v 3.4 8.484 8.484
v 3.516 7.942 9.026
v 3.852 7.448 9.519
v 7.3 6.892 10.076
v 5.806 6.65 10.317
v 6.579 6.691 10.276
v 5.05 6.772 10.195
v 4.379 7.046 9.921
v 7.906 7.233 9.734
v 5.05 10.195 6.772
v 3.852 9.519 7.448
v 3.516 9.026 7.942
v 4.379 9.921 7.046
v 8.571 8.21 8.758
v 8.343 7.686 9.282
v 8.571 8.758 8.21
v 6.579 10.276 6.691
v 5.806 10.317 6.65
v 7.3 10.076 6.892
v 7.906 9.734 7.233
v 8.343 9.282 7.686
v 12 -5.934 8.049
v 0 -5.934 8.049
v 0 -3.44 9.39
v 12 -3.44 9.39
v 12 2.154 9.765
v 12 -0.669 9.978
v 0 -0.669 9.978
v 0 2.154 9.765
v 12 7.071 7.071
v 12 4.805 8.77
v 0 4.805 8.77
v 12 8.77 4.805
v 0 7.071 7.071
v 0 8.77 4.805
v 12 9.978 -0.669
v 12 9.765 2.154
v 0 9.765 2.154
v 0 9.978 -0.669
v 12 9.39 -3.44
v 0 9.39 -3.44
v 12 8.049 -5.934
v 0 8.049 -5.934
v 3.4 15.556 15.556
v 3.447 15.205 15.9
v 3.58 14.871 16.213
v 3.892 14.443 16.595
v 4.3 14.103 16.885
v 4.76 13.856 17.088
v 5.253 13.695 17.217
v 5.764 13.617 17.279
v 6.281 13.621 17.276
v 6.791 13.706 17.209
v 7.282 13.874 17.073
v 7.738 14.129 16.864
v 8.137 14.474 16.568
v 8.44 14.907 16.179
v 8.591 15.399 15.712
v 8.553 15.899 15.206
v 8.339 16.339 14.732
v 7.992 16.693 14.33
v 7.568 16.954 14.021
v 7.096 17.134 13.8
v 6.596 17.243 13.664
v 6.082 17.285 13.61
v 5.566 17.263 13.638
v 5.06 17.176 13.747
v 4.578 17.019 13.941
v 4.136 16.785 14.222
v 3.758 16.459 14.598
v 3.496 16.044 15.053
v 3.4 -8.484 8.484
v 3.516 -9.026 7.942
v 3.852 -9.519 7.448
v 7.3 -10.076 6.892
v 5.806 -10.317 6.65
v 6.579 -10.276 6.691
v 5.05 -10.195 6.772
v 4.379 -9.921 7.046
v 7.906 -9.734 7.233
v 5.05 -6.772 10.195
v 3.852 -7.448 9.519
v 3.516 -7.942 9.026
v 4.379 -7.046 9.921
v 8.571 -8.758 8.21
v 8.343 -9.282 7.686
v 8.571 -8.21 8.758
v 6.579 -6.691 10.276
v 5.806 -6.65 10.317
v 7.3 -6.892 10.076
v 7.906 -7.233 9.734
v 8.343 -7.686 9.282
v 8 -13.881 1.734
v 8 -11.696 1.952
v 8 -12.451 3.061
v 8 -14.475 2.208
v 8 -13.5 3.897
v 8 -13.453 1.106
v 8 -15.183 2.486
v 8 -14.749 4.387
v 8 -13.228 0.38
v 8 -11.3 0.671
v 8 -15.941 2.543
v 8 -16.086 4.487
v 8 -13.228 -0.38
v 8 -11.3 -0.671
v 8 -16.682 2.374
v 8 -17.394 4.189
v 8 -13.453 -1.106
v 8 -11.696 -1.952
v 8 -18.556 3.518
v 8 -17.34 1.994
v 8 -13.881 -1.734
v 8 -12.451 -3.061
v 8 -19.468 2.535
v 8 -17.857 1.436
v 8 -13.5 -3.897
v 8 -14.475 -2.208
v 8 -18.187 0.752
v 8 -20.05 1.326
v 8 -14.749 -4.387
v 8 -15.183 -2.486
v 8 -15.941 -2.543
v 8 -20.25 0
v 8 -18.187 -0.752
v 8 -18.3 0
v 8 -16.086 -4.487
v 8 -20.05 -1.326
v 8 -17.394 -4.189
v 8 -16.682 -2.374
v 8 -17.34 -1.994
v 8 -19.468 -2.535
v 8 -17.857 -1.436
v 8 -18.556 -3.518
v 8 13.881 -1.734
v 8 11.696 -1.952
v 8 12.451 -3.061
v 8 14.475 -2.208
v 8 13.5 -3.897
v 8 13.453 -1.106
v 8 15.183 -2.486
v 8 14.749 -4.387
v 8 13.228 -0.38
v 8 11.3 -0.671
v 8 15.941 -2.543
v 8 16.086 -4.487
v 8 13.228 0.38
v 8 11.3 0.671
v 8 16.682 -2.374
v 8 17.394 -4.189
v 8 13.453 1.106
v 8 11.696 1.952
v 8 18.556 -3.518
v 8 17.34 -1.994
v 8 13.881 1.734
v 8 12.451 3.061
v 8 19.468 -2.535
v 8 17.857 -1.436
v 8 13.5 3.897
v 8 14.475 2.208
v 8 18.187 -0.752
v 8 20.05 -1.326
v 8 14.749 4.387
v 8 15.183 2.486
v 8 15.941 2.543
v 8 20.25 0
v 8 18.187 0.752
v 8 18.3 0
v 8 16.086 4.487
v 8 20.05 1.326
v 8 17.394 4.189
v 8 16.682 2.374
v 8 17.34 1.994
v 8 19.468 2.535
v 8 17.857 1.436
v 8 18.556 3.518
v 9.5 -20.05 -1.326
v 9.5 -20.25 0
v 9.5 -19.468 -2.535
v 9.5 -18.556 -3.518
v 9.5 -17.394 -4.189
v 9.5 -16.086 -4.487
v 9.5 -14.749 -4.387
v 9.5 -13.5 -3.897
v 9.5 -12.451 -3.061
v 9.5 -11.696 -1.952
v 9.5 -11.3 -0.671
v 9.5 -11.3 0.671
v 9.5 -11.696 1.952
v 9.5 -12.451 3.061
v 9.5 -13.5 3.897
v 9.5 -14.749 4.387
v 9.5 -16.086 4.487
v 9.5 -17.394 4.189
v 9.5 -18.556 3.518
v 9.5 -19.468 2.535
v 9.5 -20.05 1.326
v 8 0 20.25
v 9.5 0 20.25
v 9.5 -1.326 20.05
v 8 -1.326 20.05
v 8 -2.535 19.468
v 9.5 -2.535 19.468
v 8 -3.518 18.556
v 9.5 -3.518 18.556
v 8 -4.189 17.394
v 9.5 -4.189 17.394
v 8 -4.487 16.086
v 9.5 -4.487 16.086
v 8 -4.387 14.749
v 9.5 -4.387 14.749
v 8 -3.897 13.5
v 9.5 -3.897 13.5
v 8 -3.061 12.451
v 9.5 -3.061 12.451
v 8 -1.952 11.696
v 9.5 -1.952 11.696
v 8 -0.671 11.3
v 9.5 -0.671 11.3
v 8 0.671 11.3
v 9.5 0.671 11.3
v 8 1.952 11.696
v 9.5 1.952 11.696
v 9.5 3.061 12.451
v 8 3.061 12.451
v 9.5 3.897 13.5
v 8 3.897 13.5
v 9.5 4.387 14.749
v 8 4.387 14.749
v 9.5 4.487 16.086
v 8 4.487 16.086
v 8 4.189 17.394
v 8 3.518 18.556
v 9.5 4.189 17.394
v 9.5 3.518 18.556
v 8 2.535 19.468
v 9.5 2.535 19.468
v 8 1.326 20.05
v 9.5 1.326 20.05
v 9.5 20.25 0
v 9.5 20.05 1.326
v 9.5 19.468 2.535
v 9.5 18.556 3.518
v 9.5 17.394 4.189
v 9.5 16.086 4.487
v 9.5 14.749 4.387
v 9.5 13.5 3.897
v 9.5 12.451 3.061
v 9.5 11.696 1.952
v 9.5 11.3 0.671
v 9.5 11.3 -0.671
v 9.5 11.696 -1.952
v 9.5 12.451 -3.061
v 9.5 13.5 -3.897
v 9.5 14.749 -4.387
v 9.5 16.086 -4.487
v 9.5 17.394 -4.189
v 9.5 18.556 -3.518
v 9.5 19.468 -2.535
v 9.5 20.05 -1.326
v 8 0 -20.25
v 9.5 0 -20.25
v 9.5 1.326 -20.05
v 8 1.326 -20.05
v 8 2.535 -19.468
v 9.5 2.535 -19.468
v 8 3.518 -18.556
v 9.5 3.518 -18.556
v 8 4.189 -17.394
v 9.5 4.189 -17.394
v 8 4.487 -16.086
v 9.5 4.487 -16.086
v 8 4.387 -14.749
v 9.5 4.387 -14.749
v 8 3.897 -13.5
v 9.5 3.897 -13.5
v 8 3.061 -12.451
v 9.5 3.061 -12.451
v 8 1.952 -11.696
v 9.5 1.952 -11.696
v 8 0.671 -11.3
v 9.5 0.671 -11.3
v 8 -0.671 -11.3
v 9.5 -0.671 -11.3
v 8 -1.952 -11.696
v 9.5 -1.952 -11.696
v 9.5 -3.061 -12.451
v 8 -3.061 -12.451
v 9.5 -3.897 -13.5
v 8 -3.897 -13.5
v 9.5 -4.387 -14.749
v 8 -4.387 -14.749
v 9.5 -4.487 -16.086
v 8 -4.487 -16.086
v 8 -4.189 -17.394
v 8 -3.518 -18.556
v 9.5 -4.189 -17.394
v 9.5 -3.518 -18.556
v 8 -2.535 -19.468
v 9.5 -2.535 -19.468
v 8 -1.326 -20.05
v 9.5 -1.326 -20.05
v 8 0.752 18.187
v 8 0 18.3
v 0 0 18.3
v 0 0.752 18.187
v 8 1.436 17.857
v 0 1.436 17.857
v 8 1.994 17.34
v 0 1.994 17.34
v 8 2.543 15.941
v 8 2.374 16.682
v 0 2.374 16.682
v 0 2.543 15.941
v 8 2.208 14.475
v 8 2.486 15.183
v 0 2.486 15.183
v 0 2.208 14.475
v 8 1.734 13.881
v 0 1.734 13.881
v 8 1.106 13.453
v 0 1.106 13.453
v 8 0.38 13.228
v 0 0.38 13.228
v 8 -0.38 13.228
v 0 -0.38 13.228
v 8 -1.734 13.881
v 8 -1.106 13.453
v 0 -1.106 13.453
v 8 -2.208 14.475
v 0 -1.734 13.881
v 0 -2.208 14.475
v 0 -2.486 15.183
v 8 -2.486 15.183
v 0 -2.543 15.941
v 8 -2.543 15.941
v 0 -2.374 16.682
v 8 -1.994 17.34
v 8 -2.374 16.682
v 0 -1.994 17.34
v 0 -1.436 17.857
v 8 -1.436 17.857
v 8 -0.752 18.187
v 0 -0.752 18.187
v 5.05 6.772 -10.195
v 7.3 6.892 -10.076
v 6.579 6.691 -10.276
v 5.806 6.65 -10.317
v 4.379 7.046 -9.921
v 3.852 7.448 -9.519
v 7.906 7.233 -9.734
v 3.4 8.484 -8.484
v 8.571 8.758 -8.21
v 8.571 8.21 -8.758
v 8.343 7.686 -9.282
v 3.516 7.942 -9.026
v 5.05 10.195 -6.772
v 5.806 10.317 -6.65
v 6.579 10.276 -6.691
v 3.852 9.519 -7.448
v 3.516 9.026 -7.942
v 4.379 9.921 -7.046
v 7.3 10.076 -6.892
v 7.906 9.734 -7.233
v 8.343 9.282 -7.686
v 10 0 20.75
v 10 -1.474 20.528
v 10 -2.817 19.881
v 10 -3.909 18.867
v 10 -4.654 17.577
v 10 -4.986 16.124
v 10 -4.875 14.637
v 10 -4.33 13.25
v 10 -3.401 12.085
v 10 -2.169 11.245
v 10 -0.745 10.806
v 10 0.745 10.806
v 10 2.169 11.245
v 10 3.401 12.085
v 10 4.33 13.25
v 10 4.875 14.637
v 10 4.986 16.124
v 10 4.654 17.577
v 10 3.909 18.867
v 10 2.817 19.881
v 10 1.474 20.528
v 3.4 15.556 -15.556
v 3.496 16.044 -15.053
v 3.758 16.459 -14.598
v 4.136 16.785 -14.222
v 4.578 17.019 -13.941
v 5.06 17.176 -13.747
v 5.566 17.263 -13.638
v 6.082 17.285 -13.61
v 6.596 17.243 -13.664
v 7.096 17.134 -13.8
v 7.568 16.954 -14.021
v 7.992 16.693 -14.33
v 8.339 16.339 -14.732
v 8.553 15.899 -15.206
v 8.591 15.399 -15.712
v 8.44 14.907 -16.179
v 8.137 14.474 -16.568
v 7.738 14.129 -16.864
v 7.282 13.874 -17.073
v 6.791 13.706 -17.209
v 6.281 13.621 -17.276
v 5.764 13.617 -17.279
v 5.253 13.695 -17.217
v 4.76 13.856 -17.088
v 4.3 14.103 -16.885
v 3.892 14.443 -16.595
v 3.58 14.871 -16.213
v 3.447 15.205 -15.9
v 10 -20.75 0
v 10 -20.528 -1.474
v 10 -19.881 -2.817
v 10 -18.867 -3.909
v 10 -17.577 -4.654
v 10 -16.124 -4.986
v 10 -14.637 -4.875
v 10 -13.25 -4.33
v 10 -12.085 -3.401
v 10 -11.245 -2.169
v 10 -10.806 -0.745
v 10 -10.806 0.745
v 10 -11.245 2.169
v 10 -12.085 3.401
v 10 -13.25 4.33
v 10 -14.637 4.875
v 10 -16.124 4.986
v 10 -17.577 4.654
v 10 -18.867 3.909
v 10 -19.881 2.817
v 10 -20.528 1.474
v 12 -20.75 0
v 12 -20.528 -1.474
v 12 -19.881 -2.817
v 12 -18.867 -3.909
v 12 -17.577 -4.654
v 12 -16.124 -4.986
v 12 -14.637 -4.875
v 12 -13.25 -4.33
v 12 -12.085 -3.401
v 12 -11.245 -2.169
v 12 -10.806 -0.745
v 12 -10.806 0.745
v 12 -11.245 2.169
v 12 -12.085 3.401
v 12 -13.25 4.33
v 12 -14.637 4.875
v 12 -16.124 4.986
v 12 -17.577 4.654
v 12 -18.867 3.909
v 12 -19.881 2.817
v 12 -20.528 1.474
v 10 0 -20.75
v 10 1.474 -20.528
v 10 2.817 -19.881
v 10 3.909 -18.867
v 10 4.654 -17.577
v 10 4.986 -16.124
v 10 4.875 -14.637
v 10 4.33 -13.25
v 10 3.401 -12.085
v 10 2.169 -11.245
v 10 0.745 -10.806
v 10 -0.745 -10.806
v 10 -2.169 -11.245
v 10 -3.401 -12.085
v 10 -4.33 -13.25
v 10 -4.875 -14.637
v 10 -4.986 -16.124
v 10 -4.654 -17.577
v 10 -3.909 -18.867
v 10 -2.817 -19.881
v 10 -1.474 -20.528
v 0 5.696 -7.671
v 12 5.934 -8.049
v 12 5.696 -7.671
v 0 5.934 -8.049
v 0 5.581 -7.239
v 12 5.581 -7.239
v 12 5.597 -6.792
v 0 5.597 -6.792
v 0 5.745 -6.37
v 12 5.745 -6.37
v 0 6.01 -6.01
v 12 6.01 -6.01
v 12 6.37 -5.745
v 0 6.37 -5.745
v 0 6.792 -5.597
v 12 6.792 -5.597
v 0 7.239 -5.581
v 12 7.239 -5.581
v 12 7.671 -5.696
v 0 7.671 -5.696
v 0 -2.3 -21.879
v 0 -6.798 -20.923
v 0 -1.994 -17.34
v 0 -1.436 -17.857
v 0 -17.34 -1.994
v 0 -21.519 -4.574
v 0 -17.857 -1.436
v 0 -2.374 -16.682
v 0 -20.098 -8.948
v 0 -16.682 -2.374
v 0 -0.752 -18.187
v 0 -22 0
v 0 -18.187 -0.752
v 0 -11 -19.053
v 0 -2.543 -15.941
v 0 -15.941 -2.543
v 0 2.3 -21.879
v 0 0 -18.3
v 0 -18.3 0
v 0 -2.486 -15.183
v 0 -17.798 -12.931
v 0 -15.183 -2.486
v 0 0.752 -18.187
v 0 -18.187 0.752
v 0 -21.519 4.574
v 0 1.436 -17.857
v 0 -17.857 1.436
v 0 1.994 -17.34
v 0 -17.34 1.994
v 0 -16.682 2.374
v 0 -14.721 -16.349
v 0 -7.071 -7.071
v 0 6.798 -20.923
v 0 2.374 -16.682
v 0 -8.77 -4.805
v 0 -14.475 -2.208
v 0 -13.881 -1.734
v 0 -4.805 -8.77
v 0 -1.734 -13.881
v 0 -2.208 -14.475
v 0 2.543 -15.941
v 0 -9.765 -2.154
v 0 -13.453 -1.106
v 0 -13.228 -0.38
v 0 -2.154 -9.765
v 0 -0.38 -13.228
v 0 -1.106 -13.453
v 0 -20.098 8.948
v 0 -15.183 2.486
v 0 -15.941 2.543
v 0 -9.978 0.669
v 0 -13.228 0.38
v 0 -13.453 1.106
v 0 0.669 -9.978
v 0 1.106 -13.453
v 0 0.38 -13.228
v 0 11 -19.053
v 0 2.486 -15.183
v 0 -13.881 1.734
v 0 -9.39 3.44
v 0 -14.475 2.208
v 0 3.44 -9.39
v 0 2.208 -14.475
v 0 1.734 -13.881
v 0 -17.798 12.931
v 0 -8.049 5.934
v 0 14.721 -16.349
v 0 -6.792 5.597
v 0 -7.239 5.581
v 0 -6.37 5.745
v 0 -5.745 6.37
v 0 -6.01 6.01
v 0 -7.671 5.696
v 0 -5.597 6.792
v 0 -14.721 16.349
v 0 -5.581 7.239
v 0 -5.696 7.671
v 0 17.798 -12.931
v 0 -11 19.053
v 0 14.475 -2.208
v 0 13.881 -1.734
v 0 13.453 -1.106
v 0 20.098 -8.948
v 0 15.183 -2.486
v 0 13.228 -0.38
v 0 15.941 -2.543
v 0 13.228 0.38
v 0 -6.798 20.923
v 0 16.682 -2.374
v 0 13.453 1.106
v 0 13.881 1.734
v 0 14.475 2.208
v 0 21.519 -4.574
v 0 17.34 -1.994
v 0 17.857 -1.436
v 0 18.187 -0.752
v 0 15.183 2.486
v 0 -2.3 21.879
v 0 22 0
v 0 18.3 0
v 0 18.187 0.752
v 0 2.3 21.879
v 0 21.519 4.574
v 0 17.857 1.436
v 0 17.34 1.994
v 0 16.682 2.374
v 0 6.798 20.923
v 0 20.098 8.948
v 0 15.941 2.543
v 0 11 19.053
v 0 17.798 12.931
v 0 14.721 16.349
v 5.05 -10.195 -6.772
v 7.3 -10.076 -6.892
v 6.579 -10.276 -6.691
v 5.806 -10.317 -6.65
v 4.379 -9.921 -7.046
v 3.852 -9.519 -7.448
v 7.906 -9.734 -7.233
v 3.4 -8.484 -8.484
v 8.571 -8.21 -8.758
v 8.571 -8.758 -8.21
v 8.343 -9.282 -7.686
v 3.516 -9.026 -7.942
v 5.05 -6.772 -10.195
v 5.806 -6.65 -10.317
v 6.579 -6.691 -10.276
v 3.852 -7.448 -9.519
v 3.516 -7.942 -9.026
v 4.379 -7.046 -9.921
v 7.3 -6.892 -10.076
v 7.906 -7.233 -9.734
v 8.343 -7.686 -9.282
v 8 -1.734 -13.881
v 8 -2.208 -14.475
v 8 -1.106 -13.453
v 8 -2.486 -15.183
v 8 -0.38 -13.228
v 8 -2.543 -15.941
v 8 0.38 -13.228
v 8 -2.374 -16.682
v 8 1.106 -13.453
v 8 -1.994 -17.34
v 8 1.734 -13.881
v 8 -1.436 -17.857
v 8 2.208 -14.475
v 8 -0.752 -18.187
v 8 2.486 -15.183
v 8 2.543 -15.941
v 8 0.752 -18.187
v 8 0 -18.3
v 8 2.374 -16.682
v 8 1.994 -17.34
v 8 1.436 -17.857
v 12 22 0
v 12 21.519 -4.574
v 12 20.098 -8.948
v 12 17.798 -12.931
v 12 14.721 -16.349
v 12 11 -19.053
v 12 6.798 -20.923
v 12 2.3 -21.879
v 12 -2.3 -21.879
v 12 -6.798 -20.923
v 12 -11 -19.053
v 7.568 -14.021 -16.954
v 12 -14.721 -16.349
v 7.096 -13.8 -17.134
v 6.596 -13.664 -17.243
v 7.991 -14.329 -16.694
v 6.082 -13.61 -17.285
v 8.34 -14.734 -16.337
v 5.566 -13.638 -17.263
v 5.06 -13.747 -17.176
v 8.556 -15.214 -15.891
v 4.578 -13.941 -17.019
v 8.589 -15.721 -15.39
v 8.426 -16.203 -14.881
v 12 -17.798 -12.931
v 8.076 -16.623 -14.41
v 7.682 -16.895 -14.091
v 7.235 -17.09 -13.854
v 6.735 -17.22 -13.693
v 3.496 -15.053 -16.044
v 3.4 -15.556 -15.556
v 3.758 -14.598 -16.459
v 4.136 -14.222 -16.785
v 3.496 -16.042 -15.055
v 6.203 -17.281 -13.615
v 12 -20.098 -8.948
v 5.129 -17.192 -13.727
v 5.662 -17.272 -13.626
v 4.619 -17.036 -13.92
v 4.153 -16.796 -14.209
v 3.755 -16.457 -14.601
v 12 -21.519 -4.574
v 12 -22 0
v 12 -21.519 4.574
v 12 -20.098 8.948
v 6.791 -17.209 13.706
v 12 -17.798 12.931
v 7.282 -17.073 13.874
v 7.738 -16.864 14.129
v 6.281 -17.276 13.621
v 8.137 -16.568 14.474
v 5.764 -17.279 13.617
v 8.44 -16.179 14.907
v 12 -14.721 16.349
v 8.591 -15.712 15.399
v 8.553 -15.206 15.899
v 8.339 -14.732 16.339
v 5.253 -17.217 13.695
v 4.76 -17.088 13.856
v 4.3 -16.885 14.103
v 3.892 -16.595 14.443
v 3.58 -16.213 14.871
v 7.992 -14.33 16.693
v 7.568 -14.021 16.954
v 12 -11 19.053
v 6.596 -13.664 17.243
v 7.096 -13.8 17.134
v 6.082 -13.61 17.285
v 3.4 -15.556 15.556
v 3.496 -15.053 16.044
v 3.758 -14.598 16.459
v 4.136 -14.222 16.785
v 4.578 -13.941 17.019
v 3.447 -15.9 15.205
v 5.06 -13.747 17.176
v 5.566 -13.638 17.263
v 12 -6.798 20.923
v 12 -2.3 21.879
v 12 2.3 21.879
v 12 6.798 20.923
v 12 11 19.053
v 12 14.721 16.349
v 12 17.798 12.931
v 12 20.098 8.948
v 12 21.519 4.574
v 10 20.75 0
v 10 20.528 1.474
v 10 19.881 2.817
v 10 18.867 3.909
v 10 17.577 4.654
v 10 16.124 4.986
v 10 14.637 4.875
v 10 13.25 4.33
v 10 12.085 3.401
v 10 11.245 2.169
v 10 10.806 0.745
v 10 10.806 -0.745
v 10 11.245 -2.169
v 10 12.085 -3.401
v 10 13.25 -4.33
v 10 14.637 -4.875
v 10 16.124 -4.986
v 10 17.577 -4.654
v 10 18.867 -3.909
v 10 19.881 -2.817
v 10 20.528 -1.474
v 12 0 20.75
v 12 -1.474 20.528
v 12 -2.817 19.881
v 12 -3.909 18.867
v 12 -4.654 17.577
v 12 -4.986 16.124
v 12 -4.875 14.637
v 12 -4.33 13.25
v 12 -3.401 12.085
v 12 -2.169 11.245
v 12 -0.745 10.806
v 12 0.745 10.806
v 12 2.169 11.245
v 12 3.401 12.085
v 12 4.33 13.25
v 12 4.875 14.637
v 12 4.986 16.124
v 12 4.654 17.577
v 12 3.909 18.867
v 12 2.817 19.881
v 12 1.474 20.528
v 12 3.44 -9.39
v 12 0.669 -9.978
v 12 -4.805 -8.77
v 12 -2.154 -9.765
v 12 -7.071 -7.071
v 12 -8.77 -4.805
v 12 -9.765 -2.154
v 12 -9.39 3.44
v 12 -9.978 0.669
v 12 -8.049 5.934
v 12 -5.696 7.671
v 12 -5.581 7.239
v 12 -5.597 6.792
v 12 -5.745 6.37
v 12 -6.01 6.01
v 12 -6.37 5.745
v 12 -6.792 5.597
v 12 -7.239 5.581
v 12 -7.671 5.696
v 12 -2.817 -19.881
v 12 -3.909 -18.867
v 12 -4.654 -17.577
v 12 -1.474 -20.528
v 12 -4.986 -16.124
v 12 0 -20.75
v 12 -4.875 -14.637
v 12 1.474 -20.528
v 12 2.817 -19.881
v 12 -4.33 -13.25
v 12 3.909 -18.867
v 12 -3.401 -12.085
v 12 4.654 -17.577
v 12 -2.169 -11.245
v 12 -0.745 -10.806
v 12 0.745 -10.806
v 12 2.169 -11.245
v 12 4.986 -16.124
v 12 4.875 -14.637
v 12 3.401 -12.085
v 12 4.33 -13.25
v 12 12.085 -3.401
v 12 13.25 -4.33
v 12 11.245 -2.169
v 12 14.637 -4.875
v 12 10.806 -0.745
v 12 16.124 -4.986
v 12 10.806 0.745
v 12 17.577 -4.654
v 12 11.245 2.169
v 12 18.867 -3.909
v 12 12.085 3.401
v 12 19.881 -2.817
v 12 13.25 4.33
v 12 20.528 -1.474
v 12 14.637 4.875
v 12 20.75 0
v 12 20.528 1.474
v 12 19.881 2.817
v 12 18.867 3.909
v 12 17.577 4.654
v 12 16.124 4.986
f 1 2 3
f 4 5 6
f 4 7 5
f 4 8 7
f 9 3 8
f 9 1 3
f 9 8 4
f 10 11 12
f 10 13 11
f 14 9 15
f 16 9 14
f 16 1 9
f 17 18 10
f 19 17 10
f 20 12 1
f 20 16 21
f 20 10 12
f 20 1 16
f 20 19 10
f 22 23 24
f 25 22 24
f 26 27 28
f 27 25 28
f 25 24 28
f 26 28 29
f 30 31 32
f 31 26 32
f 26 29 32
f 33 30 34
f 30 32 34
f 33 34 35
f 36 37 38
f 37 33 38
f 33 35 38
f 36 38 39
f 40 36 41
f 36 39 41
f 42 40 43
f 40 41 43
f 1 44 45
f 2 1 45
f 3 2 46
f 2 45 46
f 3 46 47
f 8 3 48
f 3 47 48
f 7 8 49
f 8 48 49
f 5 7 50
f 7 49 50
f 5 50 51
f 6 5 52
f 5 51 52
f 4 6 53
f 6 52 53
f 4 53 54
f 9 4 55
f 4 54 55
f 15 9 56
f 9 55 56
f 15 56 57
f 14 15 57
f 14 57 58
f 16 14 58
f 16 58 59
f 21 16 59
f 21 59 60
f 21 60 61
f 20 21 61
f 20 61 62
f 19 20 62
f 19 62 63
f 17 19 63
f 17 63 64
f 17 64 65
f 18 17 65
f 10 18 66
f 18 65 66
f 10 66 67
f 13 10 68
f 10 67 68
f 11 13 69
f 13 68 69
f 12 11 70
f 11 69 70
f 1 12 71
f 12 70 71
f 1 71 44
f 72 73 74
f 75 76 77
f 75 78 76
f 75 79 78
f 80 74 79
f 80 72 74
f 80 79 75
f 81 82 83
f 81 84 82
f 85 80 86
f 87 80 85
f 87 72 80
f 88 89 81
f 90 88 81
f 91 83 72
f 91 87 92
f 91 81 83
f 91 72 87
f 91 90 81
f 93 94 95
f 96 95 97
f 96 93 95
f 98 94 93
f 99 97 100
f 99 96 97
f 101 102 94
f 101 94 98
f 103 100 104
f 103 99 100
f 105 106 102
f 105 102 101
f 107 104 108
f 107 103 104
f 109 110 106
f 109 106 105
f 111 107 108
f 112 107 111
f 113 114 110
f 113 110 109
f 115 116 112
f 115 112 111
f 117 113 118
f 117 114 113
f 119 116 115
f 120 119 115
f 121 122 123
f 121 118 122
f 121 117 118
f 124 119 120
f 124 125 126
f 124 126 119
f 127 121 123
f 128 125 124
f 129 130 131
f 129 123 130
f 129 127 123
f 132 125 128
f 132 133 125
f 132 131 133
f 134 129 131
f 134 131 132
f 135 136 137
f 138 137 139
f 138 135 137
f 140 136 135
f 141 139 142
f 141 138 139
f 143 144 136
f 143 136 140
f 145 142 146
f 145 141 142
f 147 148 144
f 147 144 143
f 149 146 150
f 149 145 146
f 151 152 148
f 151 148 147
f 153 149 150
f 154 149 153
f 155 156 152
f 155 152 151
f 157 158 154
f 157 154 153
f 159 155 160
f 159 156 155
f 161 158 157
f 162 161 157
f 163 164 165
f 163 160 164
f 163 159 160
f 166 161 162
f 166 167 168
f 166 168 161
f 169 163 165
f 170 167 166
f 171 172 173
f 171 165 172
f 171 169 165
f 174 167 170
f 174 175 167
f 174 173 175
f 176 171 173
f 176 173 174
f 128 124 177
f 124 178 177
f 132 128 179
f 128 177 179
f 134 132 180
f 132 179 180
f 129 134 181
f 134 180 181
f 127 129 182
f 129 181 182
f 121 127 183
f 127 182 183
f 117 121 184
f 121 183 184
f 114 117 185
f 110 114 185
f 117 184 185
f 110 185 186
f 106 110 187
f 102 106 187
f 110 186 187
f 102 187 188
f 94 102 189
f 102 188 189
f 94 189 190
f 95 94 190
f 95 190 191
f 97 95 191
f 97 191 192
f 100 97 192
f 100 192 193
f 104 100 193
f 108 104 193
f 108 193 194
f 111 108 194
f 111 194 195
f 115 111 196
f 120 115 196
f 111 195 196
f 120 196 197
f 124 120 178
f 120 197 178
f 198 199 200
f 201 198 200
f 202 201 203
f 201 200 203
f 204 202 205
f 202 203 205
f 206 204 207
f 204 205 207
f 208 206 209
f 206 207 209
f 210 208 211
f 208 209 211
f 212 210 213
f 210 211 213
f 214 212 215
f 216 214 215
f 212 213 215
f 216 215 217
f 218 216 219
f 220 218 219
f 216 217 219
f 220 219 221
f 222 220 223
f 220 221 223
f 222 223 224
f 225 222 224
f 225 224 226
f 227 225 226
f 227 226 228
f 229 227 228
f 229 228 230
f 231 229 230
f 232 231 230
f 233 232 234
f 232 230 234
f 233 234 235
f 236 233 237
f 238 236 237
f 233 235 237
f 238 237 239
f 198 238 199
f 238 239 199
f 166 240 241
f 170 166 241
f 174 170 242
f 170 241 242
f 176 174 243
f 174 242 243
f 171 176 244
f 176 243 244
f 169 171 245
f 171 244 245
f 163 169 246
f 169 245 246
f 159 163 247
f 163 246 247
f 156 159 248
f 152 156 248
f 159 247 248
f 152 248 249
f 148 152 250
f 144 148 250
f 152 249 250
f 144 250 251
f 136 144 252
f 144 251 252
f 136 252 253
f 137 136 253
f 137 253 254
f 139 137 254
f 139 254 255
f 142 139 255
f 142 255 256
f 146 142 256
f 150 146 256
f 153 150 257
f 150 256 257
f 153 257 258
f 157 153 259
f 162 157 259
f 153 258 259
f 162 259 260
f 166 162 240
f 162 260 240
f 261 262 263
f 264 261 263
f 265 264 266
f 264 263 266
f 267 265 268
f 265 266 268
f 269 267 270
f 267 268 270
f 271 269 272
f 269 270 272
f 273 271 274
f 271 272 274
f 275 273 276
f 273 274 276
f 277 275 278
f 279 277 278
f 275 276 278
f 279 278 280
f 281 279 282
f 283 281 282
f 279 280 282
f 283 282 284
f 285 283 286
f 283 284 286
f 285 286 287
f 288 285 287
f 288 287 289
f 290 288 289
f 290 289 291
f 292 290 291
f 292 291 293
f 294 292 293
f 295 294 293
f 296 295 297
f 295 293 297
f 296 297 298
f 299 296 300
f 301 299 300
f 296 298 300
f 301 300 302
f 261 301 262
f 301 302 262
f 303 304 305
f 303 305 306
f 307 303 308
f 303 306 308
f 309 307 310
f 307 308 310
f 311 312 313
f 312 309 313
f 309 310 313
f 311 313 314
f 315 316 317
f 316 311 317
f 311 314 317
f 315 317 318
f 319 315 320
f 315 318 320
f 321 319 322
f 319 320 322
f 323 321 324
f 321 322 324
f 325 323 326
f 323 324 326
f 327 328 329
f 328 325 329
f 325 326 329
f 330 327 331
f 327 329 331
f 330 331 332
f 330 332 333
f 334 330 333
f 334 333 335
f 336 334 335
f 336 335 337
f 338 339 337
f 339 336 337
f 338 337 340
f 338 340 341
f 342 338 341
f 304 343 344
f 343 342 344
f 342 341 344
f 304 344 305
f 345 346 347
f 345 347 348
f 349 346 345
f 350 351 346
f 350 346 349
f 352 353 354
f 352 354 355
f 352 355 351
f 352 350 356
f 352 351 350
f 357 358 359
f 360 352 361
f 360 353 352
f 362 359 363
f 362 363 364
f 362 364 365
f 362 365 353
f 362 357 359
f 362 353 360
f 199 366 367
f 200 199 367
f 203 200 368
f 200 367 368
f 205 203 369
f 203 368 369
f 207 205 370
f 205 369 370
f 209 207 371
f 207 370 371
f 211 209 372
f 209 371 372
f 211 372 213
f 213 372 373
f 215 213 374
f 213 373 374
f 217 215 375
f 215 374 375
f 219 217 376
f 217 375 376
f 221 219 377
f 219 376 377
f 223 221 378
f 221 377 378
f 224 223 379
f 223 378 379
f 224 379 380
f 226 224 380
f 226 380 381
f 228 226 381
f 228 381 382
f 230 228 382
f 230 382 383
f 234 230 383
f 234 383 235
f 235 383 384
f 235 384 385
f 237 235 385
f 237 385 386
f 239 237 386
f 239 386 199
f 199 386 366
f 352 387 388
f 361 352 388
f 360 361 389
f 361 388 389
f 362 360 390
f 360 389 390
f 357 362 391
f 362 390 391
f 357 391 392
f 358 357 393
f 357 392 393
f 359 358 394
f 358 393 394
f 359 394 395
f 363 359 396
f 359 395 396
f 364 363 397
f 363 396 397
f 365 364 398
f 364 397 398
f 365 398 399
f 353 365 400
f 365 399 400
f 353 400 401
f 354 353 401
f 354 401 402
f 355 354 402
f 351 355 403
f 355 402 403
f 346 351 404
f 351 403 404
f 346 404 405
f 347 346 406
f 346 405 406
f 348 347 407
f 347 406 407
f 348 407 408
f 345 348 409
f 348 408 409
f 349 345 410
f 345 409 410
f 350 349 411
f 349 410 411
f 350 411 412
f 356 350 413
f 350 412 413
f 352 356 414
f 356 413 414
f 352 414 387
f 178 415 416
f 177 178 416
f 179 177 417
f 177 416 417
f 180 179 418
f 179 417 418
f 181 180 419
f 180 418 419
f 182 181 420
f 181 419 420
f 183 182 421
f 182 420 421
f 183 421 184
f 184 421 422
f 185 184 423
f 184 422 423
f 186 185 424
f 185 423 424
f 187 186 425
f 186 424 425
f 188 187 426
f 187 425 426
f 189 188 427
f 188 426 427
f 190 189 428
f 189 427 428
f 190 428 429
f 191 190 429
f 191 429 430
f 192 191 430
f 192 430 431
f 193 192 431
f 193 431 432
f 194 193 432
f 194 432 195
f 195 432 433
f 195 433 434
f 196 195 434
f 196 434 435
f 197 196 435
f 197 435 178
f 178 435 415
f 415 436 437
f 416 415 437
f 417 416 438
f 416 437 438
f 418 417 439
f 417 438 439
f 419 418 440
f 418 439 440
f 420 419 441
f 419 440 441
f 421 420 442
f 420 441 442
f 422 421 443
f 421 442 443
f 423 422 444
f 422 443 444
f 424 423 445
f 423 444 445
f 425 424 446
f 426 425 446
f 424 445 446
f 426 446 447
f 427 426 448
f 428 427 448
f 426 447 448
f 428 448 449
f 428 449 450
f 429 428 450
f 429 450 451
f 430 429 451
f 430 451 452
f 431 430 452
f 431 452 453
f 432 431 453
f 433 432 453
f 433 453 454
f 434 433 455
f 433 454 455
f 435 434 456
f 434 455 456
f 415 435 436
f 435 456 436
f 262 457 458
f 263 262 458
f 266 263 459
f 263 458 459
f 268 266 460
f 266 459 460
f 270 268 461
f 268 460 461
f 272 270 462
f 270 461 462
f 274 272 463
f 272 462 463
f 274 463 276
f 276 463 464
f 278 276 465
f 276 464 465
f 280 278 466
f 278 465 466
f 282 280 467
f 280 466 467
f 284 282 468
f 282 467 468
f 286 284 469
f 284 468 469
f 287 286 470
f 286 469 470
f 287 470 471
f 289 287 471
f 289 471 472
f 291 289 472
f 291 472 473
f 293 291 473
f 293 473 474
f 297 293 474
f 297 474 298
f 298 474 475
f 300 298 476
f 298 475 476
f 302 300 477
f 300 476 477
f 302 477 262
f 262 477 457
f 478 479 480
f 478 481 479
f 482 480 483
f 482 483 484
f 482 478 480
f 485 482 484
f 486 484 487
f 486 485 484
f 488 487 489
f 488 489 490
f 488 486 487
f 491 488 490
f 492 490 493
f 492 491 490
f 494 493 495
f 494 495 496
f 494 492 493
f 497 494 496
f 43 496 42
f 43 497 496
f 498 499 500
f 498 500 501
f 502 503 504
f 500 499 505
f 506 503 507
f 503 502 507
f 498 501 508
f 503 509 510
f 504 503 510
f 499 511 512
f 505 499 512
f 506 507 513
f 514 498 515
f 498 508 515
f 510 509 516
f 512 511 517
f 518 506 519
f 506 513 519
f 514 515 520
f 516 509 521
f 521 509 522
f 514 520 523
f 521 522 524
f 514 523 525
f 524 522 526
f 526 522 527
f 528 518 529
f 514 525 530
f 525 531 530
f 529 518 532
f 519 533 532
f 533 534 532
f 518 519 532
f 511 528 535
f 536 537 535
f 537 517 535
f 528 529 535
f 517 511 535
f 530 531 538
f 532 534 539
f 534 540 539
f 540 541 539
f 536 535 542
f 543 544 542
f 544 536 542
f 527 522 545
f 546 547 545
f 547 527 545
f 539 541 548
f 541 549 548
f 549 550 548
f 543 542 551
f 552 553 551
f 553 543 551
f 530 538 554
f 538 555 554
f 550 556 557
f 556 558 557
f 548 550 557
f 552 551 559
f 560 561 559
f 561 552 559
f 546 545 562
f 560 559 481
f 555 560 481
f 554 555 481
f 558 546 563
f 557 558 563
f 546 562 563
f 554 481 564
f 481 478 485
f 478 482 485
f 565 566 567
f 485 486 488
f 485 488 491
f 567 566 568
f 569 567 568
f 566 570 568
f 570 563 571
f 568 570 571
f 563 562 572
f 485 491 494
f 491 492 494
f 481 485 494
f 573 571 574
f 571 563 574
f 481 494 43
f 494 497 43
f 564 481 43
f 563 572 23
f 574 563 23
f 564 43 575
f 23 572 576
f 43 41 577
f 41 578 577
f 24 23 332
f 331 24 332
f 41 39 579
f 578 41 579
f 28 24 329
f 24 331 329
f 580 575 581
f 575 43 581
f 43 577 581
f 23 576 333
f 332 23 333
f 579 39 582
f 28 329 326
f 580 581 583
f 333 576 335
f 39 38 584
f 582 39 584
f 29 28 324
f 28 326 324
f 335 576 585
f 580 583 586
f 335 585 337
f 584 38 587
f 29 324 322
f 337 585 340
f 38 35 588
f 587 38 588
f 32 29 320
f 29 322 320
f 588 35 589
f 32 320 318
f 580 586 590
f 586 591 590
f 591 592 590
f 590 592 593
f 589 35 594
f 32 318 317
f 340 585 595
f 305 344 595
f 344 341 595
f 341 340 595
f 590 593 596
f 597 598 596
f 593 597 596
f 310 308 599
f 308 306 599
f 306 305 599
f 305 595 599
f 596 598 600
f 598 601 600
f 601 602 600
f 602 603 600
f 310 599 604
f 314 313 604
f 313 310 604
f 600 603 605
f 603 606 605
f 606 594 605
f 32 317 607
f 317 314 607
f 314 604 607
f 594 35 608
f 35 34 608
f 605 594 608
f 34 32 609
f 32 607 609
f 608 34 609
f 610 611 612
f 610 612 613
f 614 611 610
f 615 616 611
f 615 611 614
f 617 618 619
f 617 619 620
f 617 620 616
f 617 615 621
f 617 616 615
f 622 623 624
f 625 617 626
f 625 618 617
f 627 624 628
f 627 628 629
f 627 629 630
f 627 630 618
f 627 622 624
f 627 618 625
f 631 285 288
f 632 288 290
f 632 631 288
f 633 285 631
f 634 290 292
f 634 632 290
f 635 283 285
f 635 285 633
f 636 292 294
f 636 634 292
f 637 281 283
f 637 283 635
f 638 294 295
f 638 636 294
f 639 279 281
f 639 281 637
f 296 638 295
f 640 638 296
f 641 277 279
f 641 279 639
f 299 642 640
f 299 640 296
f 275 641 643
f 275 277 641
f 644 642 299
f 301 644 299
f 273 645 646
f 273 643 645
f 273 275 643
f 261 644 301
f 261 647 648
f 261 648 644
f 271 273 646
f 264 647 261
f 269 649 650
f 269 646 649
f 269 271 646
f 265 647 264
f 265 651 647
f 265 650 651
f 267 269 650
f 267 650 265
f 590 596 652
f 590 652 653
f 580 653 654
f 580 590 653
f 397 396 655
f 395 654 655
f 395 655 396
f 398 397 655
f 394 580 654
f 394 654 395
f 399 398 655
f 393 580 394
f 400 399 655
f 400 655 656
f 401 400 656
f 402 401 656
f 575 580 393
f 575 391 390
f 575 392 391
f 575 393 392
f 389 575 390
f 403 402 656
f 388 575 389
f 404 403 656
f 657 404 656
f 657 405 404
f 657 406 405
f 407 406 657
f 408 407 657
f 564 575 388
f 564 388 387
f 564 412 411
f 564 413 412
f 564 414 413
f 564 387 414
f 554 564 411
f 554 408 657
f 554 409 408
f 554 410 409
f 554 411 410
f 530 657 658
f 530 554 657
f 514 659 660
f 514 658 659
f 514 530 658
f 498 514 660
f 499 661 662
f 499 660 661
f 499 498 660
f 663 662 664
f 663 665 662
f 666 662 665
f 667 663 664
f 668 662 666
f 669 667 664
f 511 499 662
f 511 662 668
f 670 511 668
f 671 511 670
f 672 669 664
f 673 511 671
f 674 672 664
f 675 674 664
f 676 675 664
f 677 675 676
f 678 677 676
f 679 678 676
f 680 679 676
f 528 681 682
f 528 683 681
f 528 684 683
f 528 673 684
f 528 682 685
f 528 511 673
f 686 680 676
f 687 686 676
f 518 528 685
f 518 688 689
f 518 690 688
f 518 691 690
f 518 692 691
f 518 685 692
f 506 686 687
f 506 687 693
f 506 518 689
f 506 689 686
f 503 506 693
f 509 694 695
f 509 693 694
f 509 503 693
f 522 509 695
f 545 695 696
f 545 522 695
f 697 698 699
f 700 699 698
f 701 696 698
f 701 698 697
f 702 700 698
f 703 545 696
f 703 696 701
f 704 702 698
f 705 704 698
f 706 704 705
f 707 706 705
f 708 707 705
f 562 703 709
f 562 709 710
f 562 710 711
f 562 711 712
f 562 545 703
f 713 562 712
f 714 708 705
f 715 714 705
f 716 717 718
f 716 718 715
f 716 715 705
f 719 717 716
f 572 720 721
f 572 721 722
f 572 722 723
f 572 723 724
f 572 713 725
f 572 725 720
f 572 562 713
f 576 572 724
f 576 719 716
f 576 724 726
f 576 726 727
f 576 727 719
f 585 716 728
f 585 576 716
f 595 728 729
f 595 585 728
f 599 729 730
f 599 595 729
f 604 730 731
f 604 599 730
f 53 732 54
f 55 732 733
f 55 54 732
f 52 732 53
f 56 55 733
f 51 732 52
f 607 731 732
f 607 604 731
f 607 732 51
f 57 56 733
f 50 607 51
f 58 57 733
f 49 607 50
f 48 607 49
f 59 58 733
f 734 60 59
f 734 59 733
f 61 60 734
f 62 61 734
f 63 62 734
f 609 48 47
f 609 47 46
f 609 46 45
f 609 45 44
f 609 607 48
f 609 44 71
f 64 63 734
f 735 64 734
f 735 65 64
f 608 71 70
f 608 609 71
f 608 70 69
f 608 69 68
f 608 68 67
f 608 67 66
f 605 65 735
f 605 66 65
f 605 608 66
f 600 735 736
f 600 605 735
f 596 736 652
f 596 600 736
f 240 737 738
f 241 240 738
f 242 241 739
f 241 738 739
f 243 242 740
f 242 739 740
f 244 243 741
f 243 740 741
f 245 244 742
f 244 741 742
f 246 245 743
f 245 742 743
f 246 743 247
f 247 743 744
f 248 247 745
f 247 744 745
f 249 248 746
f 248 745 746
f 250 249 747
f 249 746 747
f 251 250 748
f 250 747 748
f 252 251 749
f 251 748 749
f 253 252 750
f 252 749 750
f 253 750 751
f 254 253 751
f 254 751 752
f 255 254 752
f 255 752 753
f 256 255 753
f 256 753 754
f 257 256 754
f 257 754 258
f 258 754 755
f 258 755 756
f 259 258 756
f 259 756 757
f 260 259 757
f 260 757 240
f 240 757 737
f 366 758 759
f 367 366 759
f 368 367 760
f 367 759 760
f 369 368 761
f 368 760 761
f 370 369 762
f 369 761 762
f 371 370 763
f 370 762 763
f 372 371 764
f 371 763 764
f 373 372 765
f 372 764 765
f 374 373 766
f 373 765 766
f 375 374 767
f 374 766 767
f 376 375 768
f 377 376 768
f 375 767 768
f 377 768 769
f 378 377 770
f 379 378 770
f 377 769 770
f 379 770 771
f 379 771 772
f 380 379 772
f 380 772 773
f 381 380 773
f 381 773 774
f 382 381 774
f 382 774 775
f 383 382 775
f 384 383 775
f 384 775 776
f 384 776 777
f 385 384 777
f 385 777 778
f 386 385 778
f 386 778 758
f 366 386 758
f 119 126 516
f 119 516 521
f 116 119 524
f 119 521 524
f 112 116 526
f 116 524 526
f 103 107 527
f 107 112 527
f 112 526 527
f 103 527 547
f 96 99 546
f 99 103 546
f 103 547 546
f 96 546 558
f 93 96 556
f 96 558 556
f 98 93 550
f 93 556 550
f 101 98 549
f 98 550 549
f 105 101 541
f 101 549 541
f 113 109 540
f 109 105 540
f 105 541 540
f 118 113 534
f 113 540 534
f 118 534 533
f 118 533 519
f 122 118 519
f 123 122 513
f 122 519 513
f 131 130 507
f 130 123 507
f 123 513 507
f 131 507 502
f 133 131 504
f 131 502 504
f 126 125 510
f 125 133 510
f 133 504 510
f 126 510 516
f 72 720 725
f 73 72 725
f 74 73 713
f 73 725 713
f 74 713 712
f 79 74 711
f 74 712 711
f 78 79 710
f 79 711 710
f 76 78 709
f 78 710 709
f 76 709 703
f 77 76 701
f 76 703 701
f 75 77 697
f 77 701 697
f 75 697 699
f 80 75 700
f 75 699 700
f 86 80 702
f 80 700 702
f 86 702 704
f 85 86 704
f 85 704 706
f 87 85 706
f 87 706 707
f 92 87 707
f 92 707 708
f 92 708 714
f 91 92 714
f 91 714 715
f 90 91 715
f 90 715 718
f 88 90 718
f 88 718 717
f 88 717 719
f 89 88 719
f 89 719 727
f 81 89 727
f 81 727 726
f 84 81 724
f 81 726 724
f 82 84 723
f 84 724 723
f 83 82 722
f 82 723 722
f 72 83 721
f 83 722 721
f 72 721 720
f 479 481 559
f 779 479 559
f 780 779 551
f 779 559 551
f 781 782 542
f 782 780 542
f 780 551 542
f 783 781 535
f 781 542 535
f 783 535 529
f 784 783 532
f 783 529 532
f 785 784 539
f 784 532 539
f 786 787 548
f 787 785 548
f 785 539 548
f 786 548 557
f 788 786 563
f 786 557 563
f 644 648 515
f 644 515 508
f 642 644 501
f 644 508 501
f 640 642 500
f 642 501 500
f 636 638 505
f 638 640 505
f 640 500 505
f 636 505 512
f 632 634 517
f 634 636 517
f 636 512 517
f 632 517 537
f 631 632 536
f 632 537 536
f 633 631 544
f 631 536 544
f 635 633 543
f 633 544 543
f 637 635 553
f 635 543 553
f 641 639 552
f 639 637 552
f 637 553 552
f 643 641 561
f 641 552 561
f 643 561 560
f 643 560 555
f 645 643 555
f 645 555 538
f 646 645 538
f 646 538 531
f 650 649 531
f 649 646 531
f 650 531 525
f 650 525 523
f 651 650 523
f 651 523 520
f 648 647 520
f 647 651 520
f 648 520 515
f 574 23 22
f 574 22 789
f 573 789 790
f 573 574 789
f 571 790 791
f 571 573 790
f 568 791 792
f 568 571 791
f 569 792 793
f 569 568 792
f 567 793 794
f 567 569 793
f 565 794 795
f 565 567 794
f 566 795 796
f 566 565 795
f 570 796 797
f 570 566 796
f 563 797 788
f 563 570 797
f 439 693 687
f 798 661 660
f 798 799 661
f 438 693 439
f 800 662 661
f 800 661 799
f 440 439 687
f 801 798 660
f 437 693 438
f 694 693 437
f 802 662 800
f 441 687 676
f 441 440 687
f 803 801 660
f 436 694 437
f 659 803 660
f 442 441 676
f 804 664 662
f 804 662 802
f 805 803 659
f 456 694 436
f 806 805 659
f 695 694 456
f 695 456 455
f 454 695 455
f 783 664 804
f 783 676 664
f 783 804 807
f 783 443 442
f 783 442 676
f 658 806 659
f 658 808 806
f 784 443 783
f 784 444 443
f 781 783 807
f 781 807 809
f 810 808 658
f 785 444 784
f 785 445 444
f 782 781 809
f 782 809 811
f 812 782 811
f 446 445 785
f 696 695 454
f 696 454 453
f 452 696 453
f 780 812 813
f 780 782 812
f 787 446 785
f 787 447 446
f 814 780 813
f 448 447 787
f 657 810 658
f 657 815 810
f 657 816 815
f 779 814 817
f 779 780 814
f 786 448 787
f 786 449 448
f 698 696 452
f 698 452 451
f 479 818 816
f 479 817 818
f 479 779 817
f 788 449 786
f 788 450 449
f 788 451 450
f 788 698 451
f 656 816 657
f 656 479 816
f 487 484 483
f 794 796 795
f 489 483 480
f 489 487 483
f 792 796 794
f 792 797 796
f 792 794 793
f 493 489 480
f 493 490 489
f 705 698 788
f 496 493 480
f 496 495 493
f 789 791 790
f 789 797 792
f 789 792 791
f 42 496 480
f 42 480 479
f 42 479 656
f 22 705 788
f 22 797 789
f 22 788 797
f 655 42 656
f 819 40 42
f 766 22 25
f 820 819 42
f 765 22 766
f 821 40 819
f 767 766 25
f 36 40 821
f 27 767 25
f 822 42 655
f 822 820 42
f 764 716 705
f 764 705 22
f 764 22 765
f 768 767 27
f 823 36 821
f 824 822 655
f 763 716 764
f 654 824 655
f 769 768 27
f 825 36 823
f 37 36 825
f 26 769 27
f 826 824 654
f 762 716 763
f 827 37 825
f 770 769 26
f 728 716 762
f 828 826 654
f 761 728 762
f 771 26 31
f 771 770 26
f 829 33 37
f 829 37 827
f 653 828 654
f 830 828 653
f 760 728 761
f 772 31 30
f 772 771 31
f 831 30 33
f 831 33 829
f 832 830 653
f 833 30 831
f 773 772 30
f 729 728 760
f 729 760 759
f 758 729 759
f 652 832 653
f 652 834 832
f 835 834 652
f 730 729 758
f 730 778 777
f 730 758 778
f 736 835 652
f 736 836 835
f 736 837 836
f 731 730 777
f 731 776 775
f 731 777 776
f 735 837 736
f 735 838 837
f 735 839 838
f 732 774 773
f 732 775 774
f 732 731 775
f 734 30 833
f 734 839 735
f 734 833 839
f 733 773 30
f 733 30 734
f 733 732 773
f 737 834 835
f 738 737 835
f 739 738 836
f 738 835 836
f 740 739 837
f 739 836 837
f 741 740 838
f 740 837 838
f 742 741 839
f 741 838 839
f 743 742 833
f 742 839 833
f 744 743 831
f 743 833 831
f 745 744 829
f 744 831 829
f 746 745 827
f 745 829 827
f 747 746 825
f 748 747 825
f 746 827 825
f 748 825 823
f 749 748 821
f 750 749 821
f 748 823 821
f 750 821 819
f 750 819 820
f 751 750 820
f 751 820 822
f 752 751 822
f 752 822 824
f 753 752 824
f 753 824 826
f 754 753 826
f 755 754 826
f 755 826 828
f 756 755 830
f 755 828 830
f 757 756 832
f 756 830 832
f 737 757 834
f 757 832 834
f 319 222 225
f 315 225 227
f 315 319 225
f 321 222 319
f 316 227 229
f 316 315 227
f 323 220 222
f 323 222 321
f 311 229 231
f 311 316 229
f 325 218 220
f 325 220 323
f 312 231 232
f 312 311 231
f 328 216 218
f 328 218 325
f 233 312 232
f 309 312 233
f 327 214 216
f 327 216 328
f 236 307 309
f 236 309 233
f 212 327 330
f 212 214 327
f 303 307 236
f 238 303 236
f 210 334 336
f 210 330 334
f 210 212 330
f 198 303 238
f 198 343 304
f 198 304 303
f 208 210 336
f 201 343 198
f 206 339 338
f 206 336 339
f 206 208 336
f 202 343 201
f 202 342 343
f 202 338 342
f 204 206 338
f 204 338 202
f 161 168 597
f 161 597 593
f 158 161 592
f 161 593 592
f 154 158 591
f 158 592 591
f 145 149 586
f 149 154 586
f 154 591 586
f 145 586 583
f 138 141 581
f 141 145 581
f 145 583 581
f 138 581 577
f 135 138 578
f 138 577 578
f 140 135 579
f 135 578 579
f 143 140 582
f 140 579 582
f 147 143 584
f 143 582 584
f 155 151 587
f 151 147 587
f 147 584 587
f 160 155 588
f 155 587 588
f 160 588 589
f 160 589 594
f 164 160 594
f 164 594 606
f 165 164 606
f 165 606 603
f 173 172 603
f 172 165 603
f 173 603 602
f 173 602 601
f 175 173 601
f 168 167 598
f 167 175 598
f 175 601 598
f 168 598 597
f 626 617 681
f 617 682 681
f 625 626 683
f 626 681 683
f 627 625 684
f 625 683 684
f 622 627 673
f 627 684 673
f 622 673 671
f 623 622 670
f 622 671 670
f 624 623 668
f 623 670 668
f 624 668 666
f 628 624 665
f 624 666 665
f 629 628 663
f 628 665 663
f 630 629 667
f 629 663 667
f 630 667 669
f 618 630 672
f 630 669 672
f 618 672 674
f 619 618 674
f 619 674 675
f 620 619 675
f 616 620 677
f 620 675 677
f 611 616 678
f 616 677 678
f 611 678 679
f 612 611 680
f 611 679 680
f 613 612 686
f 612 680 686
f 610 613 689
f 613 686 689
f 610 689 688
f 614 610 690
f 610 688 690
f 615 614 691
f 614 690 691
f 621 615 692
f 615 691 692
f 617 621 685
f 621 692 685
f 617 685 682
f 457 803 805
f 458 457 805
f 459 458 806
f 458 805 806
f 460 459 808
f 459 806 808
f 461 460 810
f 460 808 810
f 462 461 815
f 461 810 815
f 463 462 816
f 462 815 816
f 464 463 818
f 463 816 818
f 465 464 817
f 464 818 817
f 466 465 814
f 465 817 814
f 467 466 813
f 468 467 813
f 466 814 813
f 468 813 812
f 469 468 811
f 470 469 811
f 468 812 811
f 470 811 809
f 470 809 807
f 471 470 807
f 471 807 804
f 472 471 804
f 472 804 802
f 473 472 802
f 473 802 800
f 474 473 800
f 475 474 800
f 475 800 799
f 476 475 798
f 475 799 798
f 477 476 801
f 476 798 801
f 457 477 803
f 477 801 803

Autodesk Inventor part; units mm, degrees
ref_plane "YZ Plane" through (0, 0, 0) normal (1, 0, 0) x (0, 1, 0)
ref_plane "XZ Plane" through (0, 0, 0) normal (0, 1, 0) x (-1, 0, 0)
ref_plane "XY Plane" through (0, 0, 0) normal (0, 0, 1) x (1, 0, 0)
sketch "Sketch2" plane through (0, 0, 0) normal (1, 0, 0) x (0, 1, 0)
  circle A0 centre (0, 0) radius 10
  circle A1 centre (0, 0) radius 22
  line L0 (0, 0) -> (7.0711, -7.0711)
  line L1 (0, 0) -> (10, 0) construction
  circle A2 centre (7.0711, -7.0711) radius 1.5
  line L2 (0, 0) -> (10.8294, 10.8294)
  line L3 (0, 0) -> (15.315, 0) construction
  circle A3 centre (-7.0711, 7.0711) radius 1.5
  dimension "d3" = 20
  dimension "d4" = 44
  dimension "d16" = 10
  dimension "d17" = 45
  dimension "d18" = 3
  dimension "d19" = 45
extrude "Extrusion1" add sketch "Sketch2" along normal blind 12 contours A2 A0 | A0 L0 A2 | A3 A0 | A0 A3 | A0 A2 L0 | A1
sketch "Sketch4" plane through (0, 0, 0) normal (1, 0, 0) x (0, 0, -1)
  circle A0 centre (0, 0) radius 15.75
  circle A1 centre (15.75, 0) radius 2.55
  dimension "d9" = 31.5
  dimension "d10" = 5.1
extrude "Extrusion3" cut sketch "Sketch4" along normal blind 30 contours A0 A1 | A0 A1 picked at (14.9184, -0.4924) picked at (16.4994, -0.6699)
sketch "Sketch5" plane through (12, 0, 0) normal (1, 0, 0) x (0, 0, -1)
  circle A0 centre (15.75, 0) radius 2.55 projected
  circle A1 centre (15.75, 0) radius 4.5
  point P0 (0, 0)
  dimension "d20" = 9
extrude "Extrusion4" cut sketch "Sketch5" against normal blind 4
sketch "Sketch6" plane through (12, 0, 0) normal (1, 0, 0) x (0, 0, -1)
  line L0 (0, 0) -> (15.5563, 15.5563)
  line L1 (0, 0) -> (22, 0) construction
  dimension "d23" = 22
  dimension "d24" = 45
ref_plane "Work Plane1" through (12, 15.5563, -15.5563) normal (0, 0.7071068, -0.7071068) x (-1, 0, 0)
sketch "Sketch7" plane through (12, 15.5563, -15.5563) normal (0, 0.7071068, -0.7071068) x (-1, 0, 0)
  line L0 (0, 22) -> (0, -22) projected
  line L1 (0, 0) -> (12, 0)
  circle A0 centre (6, 0) radius 2.6
  dimension "d25" = 5.2
extrude "Extrusion5" cut sketch "Sketch7" against normal blind 10
ref_plane "Work Plane2" through (12, 0, 0) normal (0, 0.7071068, -0.7071068) x (-1, 0, 0)
thread "Thread1" size "M5x0.8" class "6H" standard "ANSI Metric M Profile" full length
mirror "Mirror1" about plane through (12, 0, 0) normal (0, 0.7071068, -0.7071068) of "Extrusion5"
sketch "Sketch8" plane through (12, 0, 0) normal (1, 0, 0) x (0, 0, -1)
  line L0 (0, 0) -> (22, 0) construction
  circle A0 centre (15.75, 0) radius 2.55 projected
  circle A1 centre (15.75, 0) radius 5
  dimension "d33" = 10
extrude "Extrusion6" cut sketch "Sketch8" against normal blind 2
chamfer "Chamfer2" distance 0.5 angle 45 1 edges at (10, 0, -11.25)
pattern_circular "Circular Pattern1" count 4 over 360 about axis through (-10, 0, 0) along (1, 0, 0) of "Extrusion3", "Extrusion4", "Extrusion6", "Chamfer2"
mirror "Mirror2" about plane through (0, 0, 0) normal (0, 0, 1) of "Extrusion5", "Mirror1"
properties part number "Pen Holder Interface V3"
